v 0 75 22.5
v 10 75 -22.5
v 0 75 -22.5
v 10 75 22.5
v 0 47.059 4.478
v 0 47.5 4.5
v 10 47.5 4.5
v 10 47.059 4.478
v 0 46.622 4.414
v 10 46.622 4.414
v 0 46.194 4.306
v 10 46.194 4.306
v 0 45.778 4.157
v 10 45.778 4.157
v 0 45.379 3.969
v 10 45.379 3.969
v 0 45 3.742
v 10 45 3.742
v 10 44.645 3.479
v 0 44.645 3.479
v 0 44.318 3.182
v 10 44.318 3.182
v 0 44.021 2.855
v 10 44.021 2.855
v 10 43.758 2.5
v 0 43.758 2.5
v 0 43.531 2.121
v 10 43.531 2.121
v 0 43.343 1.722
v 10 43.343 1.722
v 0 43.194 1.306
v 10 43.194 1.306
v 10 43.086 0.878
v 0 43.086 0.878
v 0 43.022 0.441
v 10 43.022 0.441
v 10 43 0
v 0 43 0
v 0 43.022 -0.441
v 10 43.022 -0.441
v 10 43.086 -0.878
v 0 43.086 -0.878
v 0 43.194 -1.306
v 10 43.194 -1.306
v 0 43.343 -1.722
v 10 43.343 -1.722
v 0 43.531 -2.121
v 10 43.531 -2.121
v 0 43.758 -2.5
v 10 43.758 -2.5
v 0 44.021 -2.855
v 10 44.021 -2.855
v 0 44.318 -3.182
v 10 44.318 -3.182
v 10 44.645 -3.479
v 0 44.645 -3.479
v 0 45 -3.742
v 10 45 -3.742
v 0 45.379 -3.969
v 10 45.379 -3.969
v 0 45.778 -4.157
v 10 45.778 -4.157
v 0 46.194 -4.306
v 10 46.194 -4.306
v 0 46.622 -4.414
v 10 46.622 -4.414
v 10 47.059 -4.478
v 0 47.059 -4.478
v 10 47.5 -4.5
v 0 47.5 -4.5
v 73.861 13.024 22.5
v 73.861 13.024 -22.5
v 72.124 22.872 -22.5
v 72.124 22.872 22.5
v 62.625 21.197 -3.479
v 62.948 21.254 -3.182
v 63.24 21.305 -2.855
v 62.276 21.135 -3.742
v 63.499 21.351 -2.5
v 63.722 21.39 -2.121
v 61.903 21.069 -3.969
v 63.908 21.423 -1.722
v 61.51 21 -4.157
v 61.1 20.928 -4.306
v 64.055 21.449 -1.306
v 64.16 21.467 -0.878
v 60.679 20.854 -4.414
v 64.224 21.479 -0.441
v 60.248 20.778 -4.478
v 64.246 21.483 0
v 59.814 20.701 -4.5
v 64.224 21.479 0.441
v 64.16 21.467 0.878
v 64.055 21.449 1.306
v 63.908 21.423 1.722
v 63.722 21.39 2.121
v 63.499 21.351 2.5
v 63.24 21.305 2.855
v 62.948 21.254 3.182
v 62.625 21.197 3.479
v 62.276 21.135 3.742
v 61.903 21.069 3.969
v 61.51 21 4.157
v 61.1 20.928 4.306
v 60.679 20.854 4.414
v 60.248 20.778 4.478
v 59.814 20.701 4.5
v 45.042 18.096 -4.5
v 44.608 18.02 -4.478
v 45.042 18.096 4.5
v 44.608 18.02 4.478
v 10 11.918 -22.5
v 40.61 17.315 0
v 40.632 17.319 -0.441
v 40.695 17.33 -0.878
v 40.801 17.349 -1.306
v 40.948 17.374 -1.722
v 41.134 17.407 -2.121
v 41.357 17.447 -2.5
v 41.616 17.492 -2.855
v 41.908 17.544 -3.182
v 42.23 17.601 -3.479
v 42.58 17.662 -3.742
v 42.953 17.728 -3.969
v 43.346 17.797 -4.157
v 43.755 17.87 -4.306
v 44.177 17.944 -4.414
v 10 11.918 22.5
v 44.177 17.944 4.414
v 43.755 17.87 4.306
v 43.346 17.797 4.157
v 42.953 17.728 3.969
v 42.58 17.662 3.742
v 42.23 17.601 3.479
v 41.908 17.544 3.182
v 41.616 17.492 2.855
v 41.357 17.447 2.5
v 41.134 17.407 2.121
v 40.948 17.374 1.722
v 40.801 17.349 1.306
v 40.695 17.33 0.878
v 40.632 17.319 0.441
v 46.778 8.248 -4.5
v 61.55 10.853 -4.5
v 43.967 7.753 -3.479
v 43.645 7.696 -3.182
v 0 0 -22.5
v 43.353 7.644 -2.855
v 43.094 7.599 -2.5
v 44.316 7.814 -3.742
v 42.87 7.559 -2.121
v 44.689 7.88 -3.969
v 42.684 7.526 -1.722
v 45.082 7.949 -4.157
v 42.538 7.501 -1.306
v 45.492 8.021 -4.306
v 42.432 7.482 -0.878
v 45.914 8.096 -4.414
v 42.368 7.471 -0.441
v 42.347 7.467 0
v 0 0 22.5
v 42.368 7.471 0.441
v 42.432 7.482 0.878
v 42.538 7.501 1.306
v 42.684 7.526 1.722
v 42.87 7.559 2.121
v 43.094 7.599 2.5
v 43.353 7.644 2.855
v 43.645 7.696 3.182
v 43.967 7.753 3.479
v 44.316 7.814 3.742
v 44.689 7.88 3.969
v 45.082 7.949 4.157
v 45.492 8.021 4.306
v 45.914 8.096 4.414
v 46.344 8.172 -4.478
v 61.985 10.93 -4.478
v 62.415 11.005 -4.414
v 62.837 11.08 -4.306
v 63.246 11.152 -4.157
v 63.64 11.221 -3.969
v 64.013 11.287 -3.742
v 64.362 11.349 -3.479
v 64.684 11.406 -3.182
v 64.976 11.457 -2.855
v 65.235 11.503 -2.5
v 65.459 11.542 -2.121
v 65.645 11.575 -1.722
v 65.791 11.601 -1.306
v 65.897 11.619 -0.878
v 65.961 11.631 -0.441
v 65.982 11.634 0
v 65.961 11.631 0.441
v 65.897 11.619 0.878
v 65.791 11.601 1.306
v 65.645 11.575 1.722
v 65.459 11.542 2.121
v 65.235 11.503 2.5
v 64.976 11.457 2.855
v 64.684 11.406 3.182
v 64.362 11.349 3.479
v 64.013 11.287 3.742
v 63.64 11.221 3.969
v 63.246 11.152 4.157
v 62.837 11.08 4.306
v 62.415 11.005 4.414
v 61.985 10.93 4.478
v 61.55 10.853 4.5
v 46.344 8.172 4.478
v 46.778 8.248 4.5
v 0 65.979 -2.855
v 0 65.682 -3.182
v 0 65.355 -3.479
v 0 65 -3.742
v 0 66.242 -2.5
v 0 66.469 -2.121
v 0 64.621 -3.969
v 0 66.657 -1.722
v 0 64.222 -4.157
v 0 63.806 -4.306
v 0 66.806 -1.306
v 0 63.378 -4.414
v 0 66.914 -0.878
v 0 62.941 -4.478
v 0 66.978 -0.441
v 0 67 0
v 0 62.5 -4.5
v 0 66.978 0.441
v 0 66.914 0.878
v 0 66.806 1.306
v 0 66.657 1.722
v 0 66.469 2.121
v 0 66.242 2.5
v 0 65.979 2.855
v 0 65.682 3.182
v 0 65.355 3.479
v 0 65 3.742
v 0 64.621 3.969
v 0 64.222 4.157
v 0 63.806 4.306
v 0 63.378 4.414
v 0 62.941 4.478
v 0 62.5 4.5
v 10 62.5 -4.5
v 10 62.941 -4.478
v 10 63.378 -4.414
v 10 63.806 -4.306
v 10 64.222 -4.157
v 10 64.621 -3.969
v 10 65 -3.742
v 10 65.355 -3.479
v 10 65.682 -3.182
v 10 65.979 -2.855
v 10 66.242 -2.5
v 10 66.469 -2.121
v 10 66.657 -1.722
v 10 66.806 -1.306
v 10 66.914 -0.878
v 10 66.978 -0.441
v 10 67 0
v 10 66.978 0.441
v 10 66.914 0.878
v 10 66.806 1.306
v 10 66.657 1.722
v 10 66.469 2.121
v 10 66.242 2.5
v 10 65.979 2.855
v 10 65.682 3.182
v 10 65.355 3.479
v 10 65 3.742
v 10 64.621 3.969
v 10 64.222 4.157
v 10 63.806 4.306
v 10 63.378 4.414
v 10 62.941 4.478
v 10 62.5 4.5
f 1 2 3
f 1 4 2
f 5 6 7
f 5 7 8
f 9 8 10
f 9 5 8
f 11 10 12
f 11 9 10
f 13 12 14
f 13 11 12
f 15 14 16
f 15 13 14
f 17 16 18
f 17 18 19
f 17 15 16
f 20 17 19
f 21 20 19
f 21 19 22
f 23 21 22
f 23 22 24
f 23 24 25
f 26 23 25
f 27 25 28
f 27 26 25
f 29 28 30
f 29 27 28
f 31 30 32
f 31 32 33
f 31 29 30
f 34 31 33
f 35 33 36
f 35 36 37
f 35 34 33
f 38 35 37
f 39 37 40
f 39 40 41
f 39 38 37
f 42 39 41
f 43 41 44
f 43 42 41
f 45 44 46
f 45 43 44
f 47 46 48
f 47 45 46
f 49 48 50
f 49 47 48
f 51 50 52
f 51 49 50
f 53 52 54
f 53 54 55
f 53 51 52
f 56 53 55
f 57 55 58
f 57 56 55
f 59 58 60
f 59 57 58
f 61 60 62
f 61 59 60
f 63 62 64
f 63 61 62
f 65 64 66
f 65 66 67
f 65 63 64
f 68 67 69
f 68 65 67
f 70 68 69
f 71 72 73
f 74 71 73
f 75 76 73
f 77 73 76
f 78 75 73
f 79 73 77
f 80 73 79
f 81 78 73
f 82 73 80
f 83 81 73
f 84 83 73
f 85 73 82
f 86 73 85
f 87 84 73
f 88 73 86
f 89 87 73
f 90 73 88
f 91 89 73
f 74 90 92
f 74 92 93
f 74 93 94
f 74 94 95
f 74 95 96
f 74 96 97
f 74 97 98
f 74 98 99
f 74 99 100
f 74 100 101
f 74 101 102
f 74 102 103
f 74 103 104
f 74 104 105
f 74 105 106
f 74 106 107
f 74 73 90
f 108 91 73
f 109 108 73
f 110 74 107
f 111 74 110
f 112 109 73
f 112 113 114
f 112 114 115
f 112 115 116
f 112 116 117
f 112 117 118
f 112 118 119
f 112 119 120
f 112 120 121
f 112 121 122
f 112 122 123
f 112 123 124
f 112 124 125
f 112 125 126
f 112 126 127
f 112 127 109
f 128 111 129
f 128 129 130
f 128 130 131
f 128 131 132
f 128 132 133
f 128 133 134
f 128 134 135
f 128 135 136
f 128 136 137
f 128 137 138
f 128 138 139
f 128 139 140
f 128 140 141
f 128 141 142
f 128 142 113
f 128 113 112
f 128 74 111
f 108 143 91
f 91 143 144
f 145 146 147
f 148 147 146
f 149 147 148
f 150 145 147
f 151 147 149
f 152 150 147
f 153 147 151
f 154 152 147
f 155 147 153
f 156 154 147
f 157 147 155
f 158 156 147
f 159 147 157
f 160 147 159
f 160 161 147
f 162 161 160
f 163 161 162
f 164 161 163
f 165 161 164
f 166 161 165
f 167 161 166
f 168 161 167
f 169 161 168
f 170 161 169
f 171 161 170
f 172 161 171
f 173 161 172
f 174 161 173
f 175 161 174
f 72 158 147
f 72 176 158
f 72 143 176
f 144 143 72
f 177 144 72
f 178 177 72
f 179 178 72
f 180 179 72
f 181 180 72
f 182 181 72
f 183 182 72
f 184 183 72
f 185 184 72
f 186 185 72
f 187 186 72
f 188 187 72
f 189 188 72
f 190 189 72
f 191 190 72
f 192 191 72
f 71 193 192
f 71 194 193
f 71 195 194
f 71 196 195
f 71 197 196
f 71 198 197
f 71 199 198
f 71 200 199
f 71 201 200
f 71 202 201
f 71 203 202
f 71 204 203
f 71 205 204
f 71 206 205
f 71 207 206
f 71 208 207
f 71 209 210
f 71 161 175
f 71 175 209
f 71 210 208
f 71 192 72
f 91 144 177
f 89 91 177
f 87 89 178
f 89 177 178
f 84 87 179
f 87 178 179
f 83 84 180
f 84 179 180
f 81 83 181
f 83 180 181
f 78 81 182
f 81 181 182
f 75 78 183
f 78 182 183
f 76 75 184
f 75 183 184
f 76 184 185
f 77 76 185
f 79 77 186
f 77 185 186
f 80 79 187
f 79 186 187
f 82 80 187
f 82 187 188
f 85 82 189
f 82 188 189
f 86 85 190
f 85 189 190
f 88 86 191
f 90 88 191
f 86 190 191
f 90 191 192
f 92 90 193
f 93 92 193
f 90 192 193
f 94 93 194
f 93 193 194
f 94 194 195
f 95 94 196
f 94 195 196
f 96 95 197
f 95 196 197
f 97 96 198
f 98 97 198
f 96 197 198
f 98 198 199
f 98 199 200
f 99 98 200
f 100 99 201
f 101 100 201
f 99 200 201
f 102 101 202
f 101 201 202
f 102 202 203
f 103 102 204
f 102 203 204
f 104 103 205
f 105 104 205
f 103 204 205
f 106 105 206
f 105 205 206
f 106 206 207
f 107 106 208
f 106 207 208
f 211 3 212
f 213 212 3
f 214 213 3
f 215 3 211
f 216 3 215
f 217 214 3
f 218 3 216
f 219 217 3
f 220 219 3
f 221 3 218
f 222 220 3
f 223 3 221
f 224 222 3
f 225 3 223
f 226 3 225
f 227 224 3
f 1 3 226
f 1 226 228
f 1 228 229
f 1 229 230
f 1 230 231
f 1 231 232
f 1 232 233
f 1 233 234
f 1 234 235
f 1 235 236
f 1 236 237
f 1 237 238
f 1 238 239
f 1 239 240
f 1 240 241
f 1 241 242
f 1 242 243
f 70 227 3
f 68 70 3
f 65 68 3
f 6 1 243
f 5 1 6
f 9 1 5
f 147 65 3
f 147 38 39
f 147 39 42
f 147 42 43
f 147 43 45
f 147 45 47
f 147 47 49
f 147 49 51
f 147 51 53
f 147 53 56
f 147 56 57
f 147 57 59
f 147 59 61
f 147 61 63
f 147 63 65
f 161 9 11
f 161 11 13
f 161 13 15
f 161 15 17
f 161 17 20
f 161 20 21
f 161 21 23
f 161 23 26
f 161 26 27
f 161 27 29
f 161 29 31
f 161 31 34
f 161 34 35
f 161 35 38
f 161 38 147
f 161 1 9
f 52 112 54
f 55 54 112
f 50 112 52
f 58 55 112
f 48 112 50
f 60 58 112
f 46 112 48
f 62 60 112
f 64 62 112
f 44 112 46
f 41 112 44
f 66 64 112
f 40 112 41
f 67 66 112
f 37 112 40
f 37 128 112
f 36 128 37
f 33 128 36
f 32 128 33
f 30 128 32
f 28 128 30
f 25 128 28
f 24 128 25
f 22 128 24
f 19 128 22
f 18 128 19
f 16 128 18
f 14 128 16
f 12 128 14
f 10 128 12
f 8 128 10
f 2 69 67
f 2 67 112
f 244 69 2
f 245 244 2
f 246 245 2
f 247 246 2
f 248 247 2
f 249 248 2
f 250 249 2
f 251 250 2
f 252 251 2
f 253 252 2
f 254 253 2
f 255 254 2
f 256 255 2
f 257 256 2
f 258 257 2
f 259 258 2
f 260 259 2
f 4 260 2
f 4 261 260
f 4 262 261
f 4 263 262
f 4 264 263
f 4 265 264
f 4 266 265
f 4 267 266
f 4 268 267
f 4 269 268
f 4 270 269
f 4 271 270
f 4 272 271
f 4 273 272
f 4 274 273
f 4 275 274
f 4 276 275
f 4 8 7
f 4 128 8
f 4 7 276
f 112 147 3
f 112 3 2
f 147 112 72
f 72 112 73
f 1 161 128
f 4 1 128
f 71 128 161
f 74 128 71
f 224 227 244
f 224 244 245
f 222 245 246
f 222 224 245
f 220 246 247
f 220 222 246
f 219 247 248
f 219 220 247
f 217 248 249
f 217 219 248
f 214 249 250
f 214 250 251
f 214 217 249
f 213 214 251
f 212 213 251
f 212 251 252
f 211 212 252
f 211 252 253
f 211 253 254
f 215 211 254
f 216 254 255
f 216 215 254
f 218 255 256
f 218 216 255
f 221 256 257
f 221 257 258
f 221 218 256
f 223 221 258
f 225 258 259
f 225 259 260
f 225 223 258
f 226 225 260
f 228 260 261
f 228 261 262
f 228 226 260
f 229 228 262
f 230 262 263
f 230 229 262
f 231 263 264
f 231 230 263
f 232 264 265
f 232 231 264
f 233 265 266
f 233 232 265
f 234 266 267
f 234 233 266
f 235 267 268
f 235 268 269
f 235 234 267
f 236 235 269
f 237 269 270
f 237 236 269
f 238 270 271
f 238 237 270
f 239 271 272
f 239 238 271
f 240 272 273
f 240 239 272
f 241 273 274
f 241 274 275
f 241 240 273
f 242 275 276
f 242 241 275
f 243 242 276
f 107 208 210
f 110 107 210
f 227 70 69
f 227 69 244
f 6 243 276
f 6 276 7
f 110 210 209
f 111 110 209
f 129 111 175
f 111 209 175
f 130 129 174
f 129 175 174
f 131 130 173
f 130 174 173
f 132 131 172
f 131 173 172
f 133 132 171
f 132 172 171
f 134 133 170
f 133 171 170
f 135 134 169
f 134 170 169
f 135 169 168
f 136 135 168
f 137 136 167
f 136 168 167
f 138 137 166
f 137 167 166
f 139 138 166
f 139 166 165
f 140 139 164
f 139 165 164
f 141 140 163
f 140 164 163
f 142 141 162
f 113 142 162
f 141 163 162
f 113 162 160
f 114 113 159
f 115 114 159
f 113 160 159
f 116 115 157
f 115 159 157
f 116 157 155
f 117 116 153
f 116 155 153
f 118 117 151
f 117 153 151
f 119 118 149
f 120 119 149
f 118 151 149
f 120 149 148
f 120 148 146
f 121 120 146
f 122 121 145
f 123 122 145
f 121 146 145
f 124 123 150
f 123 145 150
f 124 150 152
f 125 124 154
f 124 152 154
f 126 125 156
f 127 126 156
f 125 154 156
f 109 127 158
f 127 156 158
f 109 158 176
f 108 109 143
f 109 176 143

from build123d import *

# Parameters (mm, degrees)
BOSS_EXTRUDE1_DEPTH      = 22.5
M8_CLEARANCE_SLOT1_DEPTH = 10


# Read off the part's stored shape, not the designer's step: M8 Clearance Slot1
with BuildPart() as part:
    # Sketch1 → Boss-Extrude1 (new, symmetric)
    with BuildSketch(Plane.XY):
        Polygon((0, 0), (73.860581476, 13.023613325), (72.124099699, 22.871690855), (10, 11.917535926), (10, 75), (0, 75), align=None)
    extrude(amount=BOSS_EXTRUDE1_DEPTH, both=True)

    # M8 Clearance Slot1 outline → M8 Clearance Slot1 (cut)
    with BuildSketch(Plane.YZ):
        with BuildLine():
            ThreePointArc((62.5, -4.5), (67, 0), (62.5, 4.5))
            Line((62.5, 4.5), (47.5, 4.5))
            ThreePointArc((47.5, 4.5), (43, 0), (47.5, -4.5))
            Line((47.5, -4.5), (62.5, -4.5))
        make_face()
    m8_clearance_slot1 = extrude(amount=M8_CLEARANCE_SLOT1_DEPTH, mode=Mode.SUBTRACT)

    # Mirror1: M8 Clearance Slot1 across plane
    add(m8_clearance_slot1.mirror(Plane(origin=(0, 0, 0), x_dir=(0, 0, 1), z_dir=(0.7660444431189772, -0.6427876096865405, 0))), mode=Mode.SUBTRACT)


solid = part.part
